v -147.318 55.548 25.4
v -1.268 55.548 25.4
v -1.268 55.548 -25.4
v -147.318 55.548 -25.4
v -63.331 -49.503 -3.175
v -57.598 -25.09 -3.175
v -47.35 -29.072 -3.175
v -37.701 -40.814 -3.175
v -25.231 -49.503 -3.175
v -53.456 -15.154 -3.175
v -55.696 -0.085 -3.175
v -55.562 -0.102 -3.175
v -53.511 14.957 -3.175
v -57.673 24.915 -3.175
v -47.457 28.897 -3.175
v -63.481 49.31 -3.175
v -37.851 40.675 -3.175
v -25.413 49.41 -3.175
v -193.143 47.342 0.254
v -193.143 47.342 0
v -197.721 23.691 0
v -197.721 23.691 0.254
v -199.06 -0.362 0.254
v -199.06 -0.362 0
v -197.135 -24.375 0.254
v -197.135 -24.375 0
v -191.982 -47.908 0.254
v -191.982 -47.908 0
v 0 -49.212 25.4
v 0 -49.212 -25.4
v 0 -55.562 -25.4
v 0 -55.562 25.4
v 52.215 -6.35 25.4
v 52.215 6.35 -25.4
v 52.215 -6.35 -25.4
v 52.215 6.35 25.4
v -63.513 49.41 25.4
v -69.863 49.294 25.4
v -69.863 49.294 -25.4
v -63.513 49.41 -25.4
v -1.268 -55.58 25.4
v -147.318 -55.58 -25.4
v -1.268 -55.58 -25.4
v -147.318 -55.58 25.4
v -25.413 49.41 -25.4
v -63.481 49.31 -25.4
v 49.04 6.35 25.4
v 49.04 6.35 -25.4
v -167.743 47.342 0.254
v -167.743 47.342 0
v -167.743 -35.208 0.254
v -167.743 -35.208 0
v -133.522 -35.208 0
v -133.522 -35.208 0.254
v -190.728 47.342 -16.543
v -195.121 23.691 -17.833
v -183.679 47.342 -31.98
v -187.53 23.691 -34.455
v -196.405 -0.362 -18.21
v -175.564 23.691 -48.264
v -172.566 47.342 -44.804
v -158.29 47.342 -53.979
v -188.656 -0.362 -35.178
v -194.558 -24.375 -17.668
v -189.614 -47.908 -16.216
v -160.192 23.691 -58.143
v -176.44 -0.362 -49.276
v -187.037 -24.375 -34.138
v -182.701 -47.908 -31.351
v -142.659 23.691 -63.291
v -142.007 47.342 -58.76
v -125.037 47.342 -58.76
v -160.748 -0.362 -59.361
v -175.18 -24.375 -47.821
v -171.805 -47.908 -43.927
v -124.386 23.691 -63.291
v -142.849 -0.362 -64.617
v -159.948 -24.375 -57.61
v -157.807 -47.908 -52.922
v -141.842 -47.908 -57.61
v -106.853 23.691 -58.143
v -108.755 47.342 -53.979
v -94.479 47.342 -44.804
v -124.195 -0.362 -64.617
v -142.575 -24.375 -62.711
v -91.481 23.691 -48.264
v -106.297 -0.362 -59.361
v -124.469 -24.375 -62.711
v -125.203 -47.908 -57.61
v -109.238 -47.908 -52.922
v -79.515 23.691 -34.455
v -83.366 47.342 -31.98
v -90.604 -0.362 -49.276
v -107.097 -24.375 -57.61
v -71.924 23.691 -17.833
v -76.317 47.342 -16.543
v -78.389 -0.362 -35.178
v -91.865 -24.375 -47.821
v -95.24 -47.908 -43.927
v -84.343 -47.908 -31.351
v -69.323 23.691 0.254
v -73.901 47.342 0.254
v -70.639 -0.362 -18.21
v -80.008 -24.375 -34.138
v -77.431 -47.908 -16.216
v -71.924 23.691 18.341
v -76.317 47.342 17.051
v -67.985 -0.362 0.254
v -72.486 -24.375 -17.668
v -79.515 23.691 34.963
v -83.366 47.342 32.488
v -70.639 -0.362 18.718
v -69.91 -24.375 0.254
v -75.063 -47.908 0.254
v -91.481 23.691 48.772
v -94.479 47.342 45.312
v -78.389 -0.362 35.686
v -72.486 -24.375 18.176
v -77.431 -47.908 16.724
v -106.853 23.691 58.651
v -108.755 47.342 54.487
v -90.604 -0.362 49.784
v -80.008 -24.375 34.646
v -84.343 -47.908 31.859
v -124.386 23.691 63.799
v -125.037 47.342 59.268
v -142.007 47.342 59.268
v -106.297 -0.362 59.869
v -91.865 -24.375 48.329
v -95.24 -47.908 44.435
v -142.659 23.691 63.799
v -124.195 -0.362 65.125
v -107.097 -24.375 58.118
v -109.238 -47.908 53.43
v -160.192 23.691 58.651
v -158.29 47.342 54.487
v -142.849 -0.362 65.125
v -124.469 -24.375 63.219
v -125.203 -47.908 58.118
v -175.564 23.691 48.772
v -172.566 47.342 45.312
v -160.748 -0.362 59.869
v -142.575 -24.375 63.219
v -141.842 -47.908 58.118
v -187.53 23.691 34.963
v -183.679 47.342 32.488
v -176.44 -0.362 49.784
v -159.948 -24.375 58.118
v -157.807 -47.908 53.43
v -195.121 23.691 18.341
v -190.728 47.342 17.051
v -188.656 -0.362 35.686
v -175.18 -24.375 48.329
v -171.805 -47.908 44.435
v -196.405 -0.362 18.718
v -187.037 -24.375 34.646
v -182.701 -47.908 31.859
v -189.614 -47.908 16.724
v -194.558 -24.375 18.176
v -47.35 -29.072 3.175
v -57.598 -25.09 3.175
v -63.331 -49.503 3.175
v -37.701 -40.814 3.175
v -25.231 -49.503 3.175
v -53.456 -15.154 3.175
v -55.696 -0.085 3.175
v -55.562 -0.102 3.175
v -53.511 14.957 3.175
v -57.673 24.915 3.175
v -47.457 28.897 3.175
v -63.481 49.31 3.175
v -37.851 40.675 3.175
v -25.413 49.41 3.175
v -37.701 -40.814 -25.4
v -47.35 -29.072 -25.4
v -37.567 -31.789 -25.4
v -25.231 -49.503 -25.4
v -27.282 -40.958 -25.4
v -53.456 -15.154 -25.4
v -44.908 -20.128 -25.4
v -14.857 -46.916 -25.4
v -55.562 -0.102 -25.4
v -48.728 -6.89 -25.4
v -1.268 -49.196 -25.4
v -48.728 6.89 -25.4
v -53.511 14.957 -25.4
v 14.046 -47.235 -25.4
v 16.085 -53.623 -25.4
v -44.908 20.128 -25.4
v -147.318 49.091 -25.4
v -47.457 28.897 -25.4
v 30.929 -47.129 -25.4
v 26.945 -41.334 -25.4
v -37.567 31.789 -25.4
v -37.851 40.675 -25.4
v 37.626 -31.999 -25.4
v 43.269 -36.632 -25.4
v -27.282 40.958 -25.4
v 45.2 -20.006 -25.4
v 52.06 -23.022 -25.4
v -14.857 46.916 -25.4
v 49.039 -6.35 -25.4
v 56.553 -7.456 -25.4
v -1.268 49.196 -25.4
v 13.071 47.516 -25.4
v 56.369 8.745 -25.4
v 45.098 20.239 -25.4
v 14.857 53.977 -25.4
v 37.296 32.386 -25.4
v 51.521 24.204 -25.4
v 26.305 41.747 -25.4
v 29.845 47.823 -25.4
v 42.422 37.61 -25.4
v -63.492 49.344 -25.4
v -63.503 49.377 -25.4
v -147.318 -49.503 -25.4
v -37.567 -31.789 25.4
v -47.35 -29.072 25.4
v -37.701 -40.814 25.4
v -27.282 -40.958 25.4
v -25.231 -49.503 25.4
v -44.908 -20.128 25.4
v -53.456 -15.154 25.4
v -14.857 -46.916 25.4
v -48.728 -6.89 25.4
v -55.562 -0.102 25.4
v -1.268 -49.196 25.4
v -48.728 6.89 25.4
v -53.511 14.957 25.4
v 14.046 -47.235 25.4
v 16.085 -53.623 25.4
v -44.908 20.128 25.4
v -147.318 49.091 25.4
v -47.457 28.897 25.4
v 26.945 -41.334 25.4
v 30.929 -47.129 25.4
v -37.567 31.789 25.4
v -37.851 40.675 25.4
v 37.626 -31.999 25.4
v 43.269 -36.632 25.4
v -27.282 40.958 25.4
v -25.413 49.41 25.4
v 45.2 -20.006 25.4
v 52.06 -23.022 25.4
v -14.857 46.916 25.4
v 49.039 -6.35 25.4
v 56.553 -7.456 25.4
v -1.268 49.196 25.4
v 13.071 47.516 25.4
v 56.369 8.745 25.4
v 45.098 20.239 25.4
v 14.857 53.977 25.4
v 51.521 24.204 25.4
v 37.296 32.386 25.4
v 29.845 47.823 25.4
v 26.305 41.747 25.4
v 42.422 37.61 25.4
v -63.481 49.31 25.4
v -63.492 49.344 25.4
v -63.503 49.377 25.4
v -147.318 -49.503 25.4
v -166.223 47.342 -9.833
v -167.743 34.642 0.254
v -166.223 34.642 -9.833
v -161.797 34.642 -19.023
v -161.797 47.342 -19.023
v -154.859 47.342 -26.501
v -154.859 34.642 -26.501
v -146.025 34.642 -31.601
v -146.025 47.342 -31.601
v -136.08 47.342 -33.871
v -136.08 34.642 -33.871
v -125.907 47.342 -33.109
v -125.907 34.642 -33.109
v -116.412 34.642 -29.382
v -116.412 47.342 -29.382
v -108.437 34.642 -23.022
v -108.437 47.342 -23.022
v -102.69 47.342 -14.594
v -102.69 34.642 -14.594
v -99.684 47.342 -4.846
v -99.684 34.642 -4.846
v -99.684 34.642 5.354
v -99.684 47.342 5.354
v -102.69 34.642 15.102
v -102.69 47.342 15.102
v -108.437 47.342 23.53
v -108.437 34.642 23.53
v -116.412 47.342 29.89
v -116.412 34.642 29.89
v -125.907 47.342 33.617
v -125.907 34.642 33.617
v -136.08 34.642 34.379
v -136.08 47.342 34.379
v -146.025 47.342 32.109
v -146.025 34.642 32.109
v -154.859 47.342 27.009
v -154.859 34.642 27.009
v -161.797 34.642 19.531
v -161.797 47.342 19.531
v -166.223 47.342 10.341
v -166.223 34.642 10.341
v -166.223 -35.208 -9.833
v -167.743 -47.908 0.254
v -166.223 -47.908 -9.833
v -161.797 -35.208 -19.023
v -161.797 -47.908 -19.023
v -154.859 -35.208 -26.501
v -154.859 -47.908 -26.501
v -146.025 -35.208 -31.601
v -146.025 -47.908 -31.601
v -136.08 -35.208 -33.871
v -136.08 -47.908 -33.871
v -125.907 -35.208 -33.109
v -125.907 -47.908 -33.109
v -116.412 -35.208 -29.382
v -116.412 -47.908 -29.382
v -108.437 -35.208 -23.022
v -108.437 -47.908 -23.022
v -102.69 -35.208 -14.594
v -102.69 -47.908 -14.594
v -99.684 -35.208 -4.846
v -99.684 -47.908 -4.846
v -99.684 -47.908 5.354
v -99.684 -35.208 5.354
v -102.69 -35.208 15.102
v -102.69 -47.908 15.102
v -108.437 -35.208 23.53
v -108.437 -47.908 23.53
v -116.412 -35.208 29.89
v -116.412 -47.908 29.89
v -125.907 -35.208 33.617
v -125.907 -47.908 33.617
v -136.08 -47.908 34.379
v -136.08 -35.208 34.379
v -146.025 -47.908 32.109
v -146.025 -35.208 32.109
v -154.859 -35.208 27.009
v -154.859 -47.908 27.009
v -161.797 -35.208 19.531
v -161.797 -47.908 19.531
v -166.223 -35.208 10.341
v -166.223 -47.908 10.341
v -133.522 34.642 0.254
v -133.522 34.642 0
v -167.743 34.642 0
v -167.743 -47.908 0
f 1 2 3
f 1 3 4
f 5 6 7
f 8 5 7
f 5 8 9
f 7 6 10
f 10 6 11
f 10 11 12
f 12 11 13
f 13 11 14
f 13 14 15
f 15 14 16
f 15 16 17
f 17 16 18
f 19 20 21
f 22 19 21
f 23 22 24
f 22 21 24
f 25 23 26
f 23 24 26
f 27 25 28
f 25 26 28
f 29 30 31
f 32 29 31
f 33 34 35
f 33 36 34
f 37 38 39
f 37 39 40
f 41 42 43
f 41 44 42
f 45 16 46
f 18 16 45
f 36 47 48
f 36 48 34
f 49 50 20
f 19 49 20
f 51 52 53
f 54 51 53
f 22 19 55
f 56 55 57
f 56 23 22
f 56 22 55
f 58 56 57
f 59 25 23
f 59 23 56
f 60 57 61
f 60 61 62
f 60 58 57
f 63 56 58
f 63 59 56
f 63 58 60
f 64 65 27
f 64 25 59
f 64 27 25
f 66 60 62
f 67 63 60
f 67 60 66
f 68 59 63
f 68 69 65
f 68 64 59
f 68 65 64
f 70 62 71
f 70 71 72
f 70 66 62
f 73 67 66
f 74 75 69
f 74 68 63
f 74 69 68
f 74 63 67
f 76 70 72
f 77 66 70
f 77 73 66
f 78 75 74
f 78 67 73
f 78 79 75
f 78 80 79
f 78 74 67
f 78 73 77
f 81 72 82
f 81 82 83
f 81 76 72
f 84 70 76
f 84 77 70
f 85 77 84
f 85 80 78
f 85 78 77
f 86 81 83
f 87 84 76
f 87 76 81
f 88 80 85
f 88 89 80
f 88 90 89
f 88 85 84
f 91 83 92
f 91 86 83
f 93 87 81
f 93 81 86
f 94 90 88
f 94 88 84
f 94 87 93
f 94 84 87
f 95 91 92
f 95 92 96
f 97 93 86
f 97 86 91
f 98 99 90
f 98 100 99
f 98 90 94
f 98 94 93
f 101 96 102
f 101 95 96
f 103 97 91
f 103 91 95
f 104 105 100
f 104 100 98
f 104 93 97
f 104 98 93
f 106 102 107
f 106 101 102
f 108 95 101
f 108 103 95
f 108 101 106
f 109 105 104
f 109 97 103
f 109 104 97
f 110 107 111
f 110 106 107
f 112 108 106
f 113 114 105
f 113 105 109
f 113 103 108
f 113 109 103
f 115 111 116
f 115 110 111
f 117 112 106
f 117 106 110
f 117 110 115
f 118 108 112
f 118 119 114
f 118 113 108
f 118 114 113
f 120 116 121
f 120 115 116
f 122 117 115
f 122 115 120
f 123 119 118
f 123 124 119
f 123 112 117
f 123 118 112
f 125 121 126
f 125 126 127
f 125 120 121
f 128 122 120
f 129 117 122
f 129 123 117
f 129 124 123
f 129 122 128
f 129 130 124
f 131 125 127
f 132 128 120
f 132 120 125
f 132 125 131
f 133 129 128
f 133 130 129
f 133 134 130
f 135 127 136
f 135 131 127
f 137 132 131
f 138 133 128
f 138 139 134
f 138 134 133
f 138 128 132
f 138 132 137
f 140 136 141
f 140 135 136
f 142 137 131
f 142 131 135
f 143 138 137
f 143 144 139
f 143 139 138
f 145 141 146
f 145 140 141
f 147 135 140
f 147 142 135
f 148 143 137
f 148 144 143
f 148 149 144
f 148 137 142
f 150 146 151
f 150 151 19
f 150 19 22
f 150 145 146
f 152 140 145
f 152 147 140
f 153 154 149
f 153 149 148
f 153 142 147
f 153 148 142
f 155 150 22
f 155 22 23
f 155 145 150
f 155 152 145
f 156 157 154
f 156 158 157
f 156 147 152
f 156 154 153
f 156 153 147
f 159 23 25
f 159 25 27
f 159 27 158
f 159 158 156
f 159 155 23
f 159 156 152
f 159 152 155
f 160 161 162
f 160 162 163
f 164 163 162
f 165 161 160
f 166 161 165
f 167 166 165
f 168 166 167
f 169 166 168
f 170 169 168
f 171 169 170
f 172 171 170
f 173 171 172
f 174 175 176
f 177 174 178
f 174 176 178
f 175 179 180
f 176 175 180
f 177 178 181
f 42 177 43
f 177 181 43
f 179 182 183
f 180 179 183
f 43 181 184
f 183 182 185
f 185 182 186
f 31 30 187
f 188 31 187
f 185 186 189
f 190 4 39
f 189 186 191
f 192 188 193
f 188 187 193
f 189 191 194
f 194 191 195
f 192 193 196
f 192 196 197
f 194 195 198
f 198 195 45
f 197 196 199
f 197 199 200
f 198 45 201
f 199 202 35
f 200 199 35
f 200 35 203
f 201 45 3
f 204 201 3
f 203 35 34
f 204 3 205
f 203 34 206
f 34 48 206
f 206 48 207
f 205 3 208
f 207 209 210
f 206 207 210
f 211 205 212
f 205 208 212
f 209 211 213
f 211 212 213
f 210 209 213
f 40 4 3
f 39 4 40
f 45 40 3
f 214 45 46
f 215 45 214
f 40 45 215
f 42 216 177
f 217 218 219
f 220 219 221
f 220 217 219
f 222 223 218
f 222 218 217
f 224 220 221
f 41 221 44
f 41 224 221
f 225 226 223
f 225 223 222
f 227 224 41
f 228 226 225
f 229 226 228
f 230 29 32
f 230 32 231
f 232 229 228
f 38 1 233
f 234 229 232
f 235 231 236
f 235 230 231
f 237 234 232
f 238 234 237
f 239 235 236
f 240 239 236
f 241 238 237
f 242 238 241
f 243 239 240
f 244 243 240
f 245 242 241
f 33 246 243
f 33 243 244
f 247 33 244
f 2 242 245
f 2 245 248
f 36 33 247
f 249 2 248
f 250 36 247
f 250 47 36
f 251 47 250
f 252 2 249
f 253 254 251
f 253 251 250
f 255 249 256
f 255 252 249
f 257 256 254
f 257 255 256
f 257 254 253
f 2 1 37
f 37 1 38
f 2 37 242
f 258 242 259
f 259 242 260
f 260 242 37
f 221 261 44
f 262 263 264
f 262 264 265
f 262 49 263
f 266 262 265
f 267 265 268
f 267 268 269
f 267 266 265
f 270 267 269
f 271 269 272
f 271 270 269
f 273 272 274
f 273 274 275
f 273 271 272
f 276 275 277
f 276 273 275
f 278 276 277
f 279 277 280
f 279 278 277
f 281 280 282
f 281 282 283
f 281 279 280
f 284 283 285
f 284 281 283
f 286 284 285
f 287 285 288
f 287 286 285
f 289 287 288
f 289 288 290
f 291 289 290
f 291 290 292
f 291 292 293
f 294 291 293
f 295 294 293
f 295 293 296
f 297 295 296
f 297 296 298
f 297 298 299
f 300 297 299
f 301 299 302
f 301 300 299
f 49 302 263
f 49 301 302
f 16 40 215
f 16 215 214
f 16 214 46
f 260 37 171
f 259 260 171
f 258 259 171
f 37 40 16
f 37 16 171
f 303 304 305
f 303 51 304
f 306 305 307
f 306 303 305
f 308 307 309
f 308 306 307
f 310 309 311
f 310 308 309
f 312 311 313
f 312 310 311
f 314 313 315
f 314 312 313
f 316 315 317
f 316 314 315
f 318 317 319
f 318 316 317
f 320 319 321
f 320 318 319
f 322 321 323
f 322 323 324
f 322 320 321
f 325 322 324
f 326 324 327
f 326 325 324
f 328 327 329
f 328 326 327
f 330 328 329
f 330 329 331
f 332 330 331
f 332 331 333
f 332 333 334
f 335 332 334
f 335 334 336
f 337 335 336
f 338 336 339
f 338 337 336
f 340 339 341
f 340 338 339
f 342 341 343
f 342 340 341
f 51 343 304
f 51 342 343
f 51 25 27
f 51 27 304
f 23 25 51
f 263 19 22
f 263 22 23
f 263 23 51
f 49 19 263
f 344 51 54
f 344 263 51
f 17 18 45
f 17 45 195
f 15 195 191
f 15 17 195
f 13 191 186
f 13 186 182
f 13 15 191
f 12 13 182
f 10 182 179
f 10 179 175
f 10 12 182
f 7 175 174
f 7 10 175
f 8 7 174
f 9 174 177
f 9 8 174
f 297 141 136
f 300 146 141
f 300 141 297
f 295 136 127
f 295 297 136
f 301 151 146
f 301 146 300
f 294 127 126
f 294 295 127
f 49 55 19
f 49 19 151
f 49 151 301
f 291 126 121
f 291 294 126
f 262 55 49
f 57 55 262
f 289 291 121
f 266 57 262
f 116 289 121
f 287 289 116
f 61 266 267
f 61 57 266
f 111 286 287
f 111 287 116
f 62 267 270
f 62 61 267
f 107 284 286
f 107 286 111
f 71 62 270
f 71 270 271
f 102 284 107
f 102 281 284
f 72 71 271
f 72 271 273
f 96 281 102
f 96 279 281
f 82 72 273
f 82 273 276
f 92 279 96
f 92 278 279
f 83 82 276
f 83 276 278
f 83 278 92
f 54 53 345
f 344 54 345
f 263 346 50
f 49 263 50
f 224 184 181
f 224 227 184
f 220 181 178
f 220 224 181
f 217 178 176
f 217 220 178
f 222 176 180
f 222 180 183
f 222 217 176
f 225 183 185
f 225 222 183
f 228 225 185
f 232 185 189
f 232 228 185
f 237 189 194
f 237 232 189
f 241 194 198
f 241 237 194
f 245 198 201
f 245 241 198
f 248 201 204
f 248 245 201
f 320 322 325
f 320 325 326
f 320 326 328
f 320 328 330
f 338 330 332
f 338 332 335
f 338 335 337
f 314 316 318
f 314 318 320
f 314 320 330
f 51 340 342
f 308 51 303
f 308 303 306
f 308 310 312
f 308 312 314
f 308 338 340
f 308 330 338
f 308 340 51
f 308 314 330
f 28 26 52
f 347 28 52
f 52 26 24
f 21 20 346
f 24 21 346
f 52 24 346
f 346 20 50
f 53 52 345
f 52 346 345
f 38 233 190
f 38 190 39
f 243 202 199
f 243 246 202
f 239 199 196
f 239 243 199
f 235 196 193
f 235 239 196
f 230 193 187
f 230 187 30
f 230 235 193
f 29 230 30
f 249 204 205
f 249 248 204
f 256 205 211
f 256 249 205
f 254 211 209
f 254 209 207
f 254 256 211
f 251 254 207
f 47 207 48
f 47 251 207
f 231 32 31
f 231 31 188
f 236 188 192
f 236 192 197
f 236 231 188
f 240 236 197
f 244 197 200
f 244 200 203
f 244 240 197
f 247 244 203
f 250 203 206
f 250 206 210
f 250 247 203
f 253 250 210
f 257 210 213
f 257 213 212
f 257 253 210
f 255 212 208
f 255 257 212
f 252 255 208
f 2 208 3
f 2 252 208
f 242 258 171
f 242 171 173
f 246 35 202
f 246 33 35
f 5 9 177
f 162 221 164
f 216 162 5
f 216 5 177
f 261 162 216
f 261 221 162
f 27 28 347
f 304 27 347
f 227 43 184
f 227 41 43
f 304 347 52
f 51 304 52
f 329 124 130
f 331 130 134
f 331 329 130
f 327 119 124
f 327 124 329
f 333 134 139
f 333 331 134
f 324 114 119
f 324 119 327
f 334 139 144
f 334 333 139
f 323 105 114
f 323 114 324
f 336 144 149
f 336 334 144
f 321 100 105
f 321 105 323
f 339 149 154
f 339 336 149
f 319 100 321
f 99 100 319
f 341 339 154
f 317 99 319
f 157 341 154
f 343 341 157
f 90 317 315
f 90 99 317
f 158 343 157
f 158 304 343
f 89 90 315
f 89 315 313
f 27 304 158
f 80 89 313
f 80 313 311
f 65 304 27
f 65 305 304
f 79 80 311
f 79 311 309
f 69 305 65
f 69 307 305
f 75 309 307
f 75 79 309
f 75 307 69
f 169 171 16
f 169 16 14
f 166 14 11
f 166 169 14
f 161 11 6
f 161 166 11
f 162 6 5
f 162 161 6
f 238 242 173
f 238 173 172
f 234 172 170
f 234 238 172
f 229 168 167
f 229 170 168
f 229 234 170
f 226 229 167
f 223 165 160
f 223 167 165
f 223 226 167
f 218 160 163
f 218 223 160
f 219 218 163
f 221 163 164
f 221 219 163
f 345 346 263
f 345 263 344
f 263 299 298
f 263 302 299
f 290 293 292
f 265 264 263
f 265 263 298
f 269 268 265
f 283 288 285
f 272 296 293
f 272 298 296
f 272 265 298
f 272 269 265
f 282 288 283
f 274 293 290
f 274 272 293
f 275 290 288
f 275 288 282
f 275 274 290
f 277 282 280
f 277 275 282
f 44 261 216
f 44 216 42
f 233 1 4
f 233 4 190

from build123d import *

# Parameters (mm, degrees)
F1_DEPTH = 25.4
F2_DEPTH = 0.254
F0_W     = 27.8709288151
F0_H     = 69.85
F3_DEPTH = 0.254
F5_DEPTH = 3.175
F6_DEPTH = 25.4


# Not quite as in the source:
# - the program builds the solid bodies; features that only make, move or delete a surface that nothing else refers to are left out


with BuildPart() as f1:
    # F0 (on Top) → F1 (new body, symmetric)
    with BuildSketch(Plane.XY):
        with BuildLine():
            ThreePointArc((-1.2680592233, -49.1961602369), (-49.2125, 0), (-1.2680592233, 49.1961602369))
            Line((-1.2680592233, 49.1961602369), (-1.2680592233, 55.5480281563))
            Line((-1.2680592233, 55.5480281563), (-147.3180592233, 55.5480281563))
            Line((-147.3180592233, 55.5480281563), (-147.3180592233, 49.091055685))
            Line((-147.3180592233, 49.091055685), (-69.8634971885, 49.2936872058))
            Line((-69.8634971885, 49.2936872058), (-63.5134971885, 49.4099743665))
            ThreePointArc((-63.5134971885, 49.4099743665), (-63.4974587718, 49.3601815353), (-63.4814364191, 49.3103835326))
            Line((-63.4814364191, 49.3103835326), (-25.4134971885, 49.4099743665))
            ThreePointArc((-25.4134971885, 49.4099743665), (-55.5624058885, -0.1022650226), (-25.2314432137, -49.5031885802))
            Line((-25.2314432137, -49.5031885802), (-63.3314432137, -49.5031885802))
            Line((-63.3314432137, -49.5031885802), (-69.6814432137, -49.5031885802))
            Line((-69.6814432137, -49.5031885802), (-147.3180592233, -49.5031885802))
            Line((-147.3180592233, -49.5031885802), (-147.3180592233, -55.5800534785))
            Line((-147.3180592233, -55.5800534785), (-1.2680592233, -55.5800534785))
            Line((-1.2680592233, -55.5800534785), (-1.2680592233, -49.1961602369))
        make_face()
    extrude(amount=F1_DEPTH, both=True)

    # F0 (on Top) → F5 (join, symmetric)
    with BuildSketch(Plane.XY):
        with BuildLine():
            ThreePointArc((49.0389416617, -6.35), (32.6236991353, -37.0532891725), (0, -49.2125))
            Line((0, -49.2125), (0, -55.5625))
            ThreePointArc((0, -55.5625), (57.0543020001, 0.6511375212), (-1.2680592233, 55.5480281563))
            Line((-1.2680592233, 55.5480281563), (-1.2680592233, 49.1961602369))
            ThreePointArc((-1.2680592233, 49.1961602369), (32.1458766832, 37.4716025001), (49.0397283671, 6.35))
            Line((49.0397283671, 6.35), (52.2147283671, 6.35))
            Line((52.2147283671, 6.35), (52.2147283671, -6.35))
            Line((52.2147283671, -6.35), (49.0389416617, -6.35))
        make_face()
        with BuildLine():
            Line((-25.4134971885, 49.4099743665), (-63.4814364191, 49.3103835326))
            ThreePointArc((-63.4814364191, 49.3103835326), (-55.6963964132, -0.0846991302), (-63.3314432137, -49.5031885802))
            Line((-63.3314432137, -49.5031885802), (-25.2314432137, -49.5031885802))
            ThreePointArc((-25.2314432137, -49.5031885802), (-55.5624058885, -0.1022650226), (-25.4134971885, 49.4099743665))
        make_face()
    extrude(amount=F5_DEPTH, both=True)

    # F0 (on Top) → F6 (join, symmetric)
    with BuildSketch(Plane.XY):
        with BuildLine():
            ThreePointArc((49.0389416617, -6.35), (32.6236991353, -37.0532891725), (0, -49.2125))
            Line((0, -49.2125), (0, -55.5625))
            ThreePointArc((0, -55.5625), (57.0543020001, 0.6511375212), (-1.2680592233, 55.5480281563))
            Line((-1.2680592233, 55.5480281563), (-1.2680592233, 49.1961602369))
            ThreePointArc((-1.2680592233, 49.1961602369), (32.1458766832, 37.4716025001), (49.0397283671, 6.35))
            Line((49.0397283671, 6.35), (52.2147283671, 6.35))
            Line((52.2147283671, 6.35), (52.2147283671, -6.35))
            Line((52.2147283671, -6.35), (49.0389416617, -6.35))
        make_face()
    extrude(amount=F6_DEPTH, both=True)


with BuildPart() as f2:
    # F0 (on Top) → F2 (new body)
    with BuildSketch(Plane.XY):
        with BuildLine():
            Line((-167.7432940599, 47.3424206634), (-193.1432940599, 47.3424206634))
            ThreePointArc((-193.1432940599, 47.3424206634), (-199.0600226604, -0.3618224561), (-191.9816406704, -47.9075793366))
            Line((-191.9816406704, -47.9075793366), (-167.7432940599, -47.9075793366))
            Line((-167.7432940599, -47.9075793366), (-167.7432940599, -35.2075793366))
            Line((-167.7432940599, -35.2075793366), (-161.3932940599, -35.2075793366))
            Line((-161.3932940599, -35.2075793366), (-161.3932940599, 34.6424206634))
            Line((-161.3932940599, 34.6424206634), (-167.7432940599, 34.6424206634))
            Line((-167.7432940599, 34.6424206634), (-167.7432940599, 47.3424206634))
        make_face()
    extrude(amount=F2_DEPTH)

    # F0 (on Top) → F3 (join)
    with BuildSketch(Plane.XY):
        with Locations((-147.4578296524, -0.2825793366)):
            Rectangle(F0_W, F0_H)
    extrude(amount=F3_DEPTH)


with BuildPart() as f4:
    # F2_face (on face) → F4 (revolve)
    with BuildSketch(Plane(origin=(-167.7046477671, -0.1151986196, 0.254), x_dir=(1, 0, 0), z_dir=(0, 0, 1))):
        with BuildLine():
            Line((34.1822825223, 34.7576192829), (-0.0386462928, 34.7576192829))
            Line((-0.0386462928, 34.7576192829), (-0.0386462928, 47.4576192829))
            Line((-0.0386462928, 47.4576192829), (-25.4386462928, 47.4576192829))
            ThreePointArc((-25.4386462928, 47.4576192829), (-31.3553748933, -0.2466238366), (-24.2769929033, -47.7923807171))
            Line((-24.2769929033, -47.7923807171), (-0.0386462928, -47.7923807171))
            Line((-0.0386462928, -47.7923807171), (-0.0386462928, -35.0923807171))
            Line((-0.0386462928, -35.0923807171), (34.1822825223, -35.0923807171))
            Line((34.1822825223, -35.0923807171), (34.1822825223, 34.7576192829))
        make_face()
    revolve(axis=Axis((-133.5223652449, -0.2825793366, 0.254), (0, -1, 0)))


solid = Compound([f1.part, f2.part, f4.part])
